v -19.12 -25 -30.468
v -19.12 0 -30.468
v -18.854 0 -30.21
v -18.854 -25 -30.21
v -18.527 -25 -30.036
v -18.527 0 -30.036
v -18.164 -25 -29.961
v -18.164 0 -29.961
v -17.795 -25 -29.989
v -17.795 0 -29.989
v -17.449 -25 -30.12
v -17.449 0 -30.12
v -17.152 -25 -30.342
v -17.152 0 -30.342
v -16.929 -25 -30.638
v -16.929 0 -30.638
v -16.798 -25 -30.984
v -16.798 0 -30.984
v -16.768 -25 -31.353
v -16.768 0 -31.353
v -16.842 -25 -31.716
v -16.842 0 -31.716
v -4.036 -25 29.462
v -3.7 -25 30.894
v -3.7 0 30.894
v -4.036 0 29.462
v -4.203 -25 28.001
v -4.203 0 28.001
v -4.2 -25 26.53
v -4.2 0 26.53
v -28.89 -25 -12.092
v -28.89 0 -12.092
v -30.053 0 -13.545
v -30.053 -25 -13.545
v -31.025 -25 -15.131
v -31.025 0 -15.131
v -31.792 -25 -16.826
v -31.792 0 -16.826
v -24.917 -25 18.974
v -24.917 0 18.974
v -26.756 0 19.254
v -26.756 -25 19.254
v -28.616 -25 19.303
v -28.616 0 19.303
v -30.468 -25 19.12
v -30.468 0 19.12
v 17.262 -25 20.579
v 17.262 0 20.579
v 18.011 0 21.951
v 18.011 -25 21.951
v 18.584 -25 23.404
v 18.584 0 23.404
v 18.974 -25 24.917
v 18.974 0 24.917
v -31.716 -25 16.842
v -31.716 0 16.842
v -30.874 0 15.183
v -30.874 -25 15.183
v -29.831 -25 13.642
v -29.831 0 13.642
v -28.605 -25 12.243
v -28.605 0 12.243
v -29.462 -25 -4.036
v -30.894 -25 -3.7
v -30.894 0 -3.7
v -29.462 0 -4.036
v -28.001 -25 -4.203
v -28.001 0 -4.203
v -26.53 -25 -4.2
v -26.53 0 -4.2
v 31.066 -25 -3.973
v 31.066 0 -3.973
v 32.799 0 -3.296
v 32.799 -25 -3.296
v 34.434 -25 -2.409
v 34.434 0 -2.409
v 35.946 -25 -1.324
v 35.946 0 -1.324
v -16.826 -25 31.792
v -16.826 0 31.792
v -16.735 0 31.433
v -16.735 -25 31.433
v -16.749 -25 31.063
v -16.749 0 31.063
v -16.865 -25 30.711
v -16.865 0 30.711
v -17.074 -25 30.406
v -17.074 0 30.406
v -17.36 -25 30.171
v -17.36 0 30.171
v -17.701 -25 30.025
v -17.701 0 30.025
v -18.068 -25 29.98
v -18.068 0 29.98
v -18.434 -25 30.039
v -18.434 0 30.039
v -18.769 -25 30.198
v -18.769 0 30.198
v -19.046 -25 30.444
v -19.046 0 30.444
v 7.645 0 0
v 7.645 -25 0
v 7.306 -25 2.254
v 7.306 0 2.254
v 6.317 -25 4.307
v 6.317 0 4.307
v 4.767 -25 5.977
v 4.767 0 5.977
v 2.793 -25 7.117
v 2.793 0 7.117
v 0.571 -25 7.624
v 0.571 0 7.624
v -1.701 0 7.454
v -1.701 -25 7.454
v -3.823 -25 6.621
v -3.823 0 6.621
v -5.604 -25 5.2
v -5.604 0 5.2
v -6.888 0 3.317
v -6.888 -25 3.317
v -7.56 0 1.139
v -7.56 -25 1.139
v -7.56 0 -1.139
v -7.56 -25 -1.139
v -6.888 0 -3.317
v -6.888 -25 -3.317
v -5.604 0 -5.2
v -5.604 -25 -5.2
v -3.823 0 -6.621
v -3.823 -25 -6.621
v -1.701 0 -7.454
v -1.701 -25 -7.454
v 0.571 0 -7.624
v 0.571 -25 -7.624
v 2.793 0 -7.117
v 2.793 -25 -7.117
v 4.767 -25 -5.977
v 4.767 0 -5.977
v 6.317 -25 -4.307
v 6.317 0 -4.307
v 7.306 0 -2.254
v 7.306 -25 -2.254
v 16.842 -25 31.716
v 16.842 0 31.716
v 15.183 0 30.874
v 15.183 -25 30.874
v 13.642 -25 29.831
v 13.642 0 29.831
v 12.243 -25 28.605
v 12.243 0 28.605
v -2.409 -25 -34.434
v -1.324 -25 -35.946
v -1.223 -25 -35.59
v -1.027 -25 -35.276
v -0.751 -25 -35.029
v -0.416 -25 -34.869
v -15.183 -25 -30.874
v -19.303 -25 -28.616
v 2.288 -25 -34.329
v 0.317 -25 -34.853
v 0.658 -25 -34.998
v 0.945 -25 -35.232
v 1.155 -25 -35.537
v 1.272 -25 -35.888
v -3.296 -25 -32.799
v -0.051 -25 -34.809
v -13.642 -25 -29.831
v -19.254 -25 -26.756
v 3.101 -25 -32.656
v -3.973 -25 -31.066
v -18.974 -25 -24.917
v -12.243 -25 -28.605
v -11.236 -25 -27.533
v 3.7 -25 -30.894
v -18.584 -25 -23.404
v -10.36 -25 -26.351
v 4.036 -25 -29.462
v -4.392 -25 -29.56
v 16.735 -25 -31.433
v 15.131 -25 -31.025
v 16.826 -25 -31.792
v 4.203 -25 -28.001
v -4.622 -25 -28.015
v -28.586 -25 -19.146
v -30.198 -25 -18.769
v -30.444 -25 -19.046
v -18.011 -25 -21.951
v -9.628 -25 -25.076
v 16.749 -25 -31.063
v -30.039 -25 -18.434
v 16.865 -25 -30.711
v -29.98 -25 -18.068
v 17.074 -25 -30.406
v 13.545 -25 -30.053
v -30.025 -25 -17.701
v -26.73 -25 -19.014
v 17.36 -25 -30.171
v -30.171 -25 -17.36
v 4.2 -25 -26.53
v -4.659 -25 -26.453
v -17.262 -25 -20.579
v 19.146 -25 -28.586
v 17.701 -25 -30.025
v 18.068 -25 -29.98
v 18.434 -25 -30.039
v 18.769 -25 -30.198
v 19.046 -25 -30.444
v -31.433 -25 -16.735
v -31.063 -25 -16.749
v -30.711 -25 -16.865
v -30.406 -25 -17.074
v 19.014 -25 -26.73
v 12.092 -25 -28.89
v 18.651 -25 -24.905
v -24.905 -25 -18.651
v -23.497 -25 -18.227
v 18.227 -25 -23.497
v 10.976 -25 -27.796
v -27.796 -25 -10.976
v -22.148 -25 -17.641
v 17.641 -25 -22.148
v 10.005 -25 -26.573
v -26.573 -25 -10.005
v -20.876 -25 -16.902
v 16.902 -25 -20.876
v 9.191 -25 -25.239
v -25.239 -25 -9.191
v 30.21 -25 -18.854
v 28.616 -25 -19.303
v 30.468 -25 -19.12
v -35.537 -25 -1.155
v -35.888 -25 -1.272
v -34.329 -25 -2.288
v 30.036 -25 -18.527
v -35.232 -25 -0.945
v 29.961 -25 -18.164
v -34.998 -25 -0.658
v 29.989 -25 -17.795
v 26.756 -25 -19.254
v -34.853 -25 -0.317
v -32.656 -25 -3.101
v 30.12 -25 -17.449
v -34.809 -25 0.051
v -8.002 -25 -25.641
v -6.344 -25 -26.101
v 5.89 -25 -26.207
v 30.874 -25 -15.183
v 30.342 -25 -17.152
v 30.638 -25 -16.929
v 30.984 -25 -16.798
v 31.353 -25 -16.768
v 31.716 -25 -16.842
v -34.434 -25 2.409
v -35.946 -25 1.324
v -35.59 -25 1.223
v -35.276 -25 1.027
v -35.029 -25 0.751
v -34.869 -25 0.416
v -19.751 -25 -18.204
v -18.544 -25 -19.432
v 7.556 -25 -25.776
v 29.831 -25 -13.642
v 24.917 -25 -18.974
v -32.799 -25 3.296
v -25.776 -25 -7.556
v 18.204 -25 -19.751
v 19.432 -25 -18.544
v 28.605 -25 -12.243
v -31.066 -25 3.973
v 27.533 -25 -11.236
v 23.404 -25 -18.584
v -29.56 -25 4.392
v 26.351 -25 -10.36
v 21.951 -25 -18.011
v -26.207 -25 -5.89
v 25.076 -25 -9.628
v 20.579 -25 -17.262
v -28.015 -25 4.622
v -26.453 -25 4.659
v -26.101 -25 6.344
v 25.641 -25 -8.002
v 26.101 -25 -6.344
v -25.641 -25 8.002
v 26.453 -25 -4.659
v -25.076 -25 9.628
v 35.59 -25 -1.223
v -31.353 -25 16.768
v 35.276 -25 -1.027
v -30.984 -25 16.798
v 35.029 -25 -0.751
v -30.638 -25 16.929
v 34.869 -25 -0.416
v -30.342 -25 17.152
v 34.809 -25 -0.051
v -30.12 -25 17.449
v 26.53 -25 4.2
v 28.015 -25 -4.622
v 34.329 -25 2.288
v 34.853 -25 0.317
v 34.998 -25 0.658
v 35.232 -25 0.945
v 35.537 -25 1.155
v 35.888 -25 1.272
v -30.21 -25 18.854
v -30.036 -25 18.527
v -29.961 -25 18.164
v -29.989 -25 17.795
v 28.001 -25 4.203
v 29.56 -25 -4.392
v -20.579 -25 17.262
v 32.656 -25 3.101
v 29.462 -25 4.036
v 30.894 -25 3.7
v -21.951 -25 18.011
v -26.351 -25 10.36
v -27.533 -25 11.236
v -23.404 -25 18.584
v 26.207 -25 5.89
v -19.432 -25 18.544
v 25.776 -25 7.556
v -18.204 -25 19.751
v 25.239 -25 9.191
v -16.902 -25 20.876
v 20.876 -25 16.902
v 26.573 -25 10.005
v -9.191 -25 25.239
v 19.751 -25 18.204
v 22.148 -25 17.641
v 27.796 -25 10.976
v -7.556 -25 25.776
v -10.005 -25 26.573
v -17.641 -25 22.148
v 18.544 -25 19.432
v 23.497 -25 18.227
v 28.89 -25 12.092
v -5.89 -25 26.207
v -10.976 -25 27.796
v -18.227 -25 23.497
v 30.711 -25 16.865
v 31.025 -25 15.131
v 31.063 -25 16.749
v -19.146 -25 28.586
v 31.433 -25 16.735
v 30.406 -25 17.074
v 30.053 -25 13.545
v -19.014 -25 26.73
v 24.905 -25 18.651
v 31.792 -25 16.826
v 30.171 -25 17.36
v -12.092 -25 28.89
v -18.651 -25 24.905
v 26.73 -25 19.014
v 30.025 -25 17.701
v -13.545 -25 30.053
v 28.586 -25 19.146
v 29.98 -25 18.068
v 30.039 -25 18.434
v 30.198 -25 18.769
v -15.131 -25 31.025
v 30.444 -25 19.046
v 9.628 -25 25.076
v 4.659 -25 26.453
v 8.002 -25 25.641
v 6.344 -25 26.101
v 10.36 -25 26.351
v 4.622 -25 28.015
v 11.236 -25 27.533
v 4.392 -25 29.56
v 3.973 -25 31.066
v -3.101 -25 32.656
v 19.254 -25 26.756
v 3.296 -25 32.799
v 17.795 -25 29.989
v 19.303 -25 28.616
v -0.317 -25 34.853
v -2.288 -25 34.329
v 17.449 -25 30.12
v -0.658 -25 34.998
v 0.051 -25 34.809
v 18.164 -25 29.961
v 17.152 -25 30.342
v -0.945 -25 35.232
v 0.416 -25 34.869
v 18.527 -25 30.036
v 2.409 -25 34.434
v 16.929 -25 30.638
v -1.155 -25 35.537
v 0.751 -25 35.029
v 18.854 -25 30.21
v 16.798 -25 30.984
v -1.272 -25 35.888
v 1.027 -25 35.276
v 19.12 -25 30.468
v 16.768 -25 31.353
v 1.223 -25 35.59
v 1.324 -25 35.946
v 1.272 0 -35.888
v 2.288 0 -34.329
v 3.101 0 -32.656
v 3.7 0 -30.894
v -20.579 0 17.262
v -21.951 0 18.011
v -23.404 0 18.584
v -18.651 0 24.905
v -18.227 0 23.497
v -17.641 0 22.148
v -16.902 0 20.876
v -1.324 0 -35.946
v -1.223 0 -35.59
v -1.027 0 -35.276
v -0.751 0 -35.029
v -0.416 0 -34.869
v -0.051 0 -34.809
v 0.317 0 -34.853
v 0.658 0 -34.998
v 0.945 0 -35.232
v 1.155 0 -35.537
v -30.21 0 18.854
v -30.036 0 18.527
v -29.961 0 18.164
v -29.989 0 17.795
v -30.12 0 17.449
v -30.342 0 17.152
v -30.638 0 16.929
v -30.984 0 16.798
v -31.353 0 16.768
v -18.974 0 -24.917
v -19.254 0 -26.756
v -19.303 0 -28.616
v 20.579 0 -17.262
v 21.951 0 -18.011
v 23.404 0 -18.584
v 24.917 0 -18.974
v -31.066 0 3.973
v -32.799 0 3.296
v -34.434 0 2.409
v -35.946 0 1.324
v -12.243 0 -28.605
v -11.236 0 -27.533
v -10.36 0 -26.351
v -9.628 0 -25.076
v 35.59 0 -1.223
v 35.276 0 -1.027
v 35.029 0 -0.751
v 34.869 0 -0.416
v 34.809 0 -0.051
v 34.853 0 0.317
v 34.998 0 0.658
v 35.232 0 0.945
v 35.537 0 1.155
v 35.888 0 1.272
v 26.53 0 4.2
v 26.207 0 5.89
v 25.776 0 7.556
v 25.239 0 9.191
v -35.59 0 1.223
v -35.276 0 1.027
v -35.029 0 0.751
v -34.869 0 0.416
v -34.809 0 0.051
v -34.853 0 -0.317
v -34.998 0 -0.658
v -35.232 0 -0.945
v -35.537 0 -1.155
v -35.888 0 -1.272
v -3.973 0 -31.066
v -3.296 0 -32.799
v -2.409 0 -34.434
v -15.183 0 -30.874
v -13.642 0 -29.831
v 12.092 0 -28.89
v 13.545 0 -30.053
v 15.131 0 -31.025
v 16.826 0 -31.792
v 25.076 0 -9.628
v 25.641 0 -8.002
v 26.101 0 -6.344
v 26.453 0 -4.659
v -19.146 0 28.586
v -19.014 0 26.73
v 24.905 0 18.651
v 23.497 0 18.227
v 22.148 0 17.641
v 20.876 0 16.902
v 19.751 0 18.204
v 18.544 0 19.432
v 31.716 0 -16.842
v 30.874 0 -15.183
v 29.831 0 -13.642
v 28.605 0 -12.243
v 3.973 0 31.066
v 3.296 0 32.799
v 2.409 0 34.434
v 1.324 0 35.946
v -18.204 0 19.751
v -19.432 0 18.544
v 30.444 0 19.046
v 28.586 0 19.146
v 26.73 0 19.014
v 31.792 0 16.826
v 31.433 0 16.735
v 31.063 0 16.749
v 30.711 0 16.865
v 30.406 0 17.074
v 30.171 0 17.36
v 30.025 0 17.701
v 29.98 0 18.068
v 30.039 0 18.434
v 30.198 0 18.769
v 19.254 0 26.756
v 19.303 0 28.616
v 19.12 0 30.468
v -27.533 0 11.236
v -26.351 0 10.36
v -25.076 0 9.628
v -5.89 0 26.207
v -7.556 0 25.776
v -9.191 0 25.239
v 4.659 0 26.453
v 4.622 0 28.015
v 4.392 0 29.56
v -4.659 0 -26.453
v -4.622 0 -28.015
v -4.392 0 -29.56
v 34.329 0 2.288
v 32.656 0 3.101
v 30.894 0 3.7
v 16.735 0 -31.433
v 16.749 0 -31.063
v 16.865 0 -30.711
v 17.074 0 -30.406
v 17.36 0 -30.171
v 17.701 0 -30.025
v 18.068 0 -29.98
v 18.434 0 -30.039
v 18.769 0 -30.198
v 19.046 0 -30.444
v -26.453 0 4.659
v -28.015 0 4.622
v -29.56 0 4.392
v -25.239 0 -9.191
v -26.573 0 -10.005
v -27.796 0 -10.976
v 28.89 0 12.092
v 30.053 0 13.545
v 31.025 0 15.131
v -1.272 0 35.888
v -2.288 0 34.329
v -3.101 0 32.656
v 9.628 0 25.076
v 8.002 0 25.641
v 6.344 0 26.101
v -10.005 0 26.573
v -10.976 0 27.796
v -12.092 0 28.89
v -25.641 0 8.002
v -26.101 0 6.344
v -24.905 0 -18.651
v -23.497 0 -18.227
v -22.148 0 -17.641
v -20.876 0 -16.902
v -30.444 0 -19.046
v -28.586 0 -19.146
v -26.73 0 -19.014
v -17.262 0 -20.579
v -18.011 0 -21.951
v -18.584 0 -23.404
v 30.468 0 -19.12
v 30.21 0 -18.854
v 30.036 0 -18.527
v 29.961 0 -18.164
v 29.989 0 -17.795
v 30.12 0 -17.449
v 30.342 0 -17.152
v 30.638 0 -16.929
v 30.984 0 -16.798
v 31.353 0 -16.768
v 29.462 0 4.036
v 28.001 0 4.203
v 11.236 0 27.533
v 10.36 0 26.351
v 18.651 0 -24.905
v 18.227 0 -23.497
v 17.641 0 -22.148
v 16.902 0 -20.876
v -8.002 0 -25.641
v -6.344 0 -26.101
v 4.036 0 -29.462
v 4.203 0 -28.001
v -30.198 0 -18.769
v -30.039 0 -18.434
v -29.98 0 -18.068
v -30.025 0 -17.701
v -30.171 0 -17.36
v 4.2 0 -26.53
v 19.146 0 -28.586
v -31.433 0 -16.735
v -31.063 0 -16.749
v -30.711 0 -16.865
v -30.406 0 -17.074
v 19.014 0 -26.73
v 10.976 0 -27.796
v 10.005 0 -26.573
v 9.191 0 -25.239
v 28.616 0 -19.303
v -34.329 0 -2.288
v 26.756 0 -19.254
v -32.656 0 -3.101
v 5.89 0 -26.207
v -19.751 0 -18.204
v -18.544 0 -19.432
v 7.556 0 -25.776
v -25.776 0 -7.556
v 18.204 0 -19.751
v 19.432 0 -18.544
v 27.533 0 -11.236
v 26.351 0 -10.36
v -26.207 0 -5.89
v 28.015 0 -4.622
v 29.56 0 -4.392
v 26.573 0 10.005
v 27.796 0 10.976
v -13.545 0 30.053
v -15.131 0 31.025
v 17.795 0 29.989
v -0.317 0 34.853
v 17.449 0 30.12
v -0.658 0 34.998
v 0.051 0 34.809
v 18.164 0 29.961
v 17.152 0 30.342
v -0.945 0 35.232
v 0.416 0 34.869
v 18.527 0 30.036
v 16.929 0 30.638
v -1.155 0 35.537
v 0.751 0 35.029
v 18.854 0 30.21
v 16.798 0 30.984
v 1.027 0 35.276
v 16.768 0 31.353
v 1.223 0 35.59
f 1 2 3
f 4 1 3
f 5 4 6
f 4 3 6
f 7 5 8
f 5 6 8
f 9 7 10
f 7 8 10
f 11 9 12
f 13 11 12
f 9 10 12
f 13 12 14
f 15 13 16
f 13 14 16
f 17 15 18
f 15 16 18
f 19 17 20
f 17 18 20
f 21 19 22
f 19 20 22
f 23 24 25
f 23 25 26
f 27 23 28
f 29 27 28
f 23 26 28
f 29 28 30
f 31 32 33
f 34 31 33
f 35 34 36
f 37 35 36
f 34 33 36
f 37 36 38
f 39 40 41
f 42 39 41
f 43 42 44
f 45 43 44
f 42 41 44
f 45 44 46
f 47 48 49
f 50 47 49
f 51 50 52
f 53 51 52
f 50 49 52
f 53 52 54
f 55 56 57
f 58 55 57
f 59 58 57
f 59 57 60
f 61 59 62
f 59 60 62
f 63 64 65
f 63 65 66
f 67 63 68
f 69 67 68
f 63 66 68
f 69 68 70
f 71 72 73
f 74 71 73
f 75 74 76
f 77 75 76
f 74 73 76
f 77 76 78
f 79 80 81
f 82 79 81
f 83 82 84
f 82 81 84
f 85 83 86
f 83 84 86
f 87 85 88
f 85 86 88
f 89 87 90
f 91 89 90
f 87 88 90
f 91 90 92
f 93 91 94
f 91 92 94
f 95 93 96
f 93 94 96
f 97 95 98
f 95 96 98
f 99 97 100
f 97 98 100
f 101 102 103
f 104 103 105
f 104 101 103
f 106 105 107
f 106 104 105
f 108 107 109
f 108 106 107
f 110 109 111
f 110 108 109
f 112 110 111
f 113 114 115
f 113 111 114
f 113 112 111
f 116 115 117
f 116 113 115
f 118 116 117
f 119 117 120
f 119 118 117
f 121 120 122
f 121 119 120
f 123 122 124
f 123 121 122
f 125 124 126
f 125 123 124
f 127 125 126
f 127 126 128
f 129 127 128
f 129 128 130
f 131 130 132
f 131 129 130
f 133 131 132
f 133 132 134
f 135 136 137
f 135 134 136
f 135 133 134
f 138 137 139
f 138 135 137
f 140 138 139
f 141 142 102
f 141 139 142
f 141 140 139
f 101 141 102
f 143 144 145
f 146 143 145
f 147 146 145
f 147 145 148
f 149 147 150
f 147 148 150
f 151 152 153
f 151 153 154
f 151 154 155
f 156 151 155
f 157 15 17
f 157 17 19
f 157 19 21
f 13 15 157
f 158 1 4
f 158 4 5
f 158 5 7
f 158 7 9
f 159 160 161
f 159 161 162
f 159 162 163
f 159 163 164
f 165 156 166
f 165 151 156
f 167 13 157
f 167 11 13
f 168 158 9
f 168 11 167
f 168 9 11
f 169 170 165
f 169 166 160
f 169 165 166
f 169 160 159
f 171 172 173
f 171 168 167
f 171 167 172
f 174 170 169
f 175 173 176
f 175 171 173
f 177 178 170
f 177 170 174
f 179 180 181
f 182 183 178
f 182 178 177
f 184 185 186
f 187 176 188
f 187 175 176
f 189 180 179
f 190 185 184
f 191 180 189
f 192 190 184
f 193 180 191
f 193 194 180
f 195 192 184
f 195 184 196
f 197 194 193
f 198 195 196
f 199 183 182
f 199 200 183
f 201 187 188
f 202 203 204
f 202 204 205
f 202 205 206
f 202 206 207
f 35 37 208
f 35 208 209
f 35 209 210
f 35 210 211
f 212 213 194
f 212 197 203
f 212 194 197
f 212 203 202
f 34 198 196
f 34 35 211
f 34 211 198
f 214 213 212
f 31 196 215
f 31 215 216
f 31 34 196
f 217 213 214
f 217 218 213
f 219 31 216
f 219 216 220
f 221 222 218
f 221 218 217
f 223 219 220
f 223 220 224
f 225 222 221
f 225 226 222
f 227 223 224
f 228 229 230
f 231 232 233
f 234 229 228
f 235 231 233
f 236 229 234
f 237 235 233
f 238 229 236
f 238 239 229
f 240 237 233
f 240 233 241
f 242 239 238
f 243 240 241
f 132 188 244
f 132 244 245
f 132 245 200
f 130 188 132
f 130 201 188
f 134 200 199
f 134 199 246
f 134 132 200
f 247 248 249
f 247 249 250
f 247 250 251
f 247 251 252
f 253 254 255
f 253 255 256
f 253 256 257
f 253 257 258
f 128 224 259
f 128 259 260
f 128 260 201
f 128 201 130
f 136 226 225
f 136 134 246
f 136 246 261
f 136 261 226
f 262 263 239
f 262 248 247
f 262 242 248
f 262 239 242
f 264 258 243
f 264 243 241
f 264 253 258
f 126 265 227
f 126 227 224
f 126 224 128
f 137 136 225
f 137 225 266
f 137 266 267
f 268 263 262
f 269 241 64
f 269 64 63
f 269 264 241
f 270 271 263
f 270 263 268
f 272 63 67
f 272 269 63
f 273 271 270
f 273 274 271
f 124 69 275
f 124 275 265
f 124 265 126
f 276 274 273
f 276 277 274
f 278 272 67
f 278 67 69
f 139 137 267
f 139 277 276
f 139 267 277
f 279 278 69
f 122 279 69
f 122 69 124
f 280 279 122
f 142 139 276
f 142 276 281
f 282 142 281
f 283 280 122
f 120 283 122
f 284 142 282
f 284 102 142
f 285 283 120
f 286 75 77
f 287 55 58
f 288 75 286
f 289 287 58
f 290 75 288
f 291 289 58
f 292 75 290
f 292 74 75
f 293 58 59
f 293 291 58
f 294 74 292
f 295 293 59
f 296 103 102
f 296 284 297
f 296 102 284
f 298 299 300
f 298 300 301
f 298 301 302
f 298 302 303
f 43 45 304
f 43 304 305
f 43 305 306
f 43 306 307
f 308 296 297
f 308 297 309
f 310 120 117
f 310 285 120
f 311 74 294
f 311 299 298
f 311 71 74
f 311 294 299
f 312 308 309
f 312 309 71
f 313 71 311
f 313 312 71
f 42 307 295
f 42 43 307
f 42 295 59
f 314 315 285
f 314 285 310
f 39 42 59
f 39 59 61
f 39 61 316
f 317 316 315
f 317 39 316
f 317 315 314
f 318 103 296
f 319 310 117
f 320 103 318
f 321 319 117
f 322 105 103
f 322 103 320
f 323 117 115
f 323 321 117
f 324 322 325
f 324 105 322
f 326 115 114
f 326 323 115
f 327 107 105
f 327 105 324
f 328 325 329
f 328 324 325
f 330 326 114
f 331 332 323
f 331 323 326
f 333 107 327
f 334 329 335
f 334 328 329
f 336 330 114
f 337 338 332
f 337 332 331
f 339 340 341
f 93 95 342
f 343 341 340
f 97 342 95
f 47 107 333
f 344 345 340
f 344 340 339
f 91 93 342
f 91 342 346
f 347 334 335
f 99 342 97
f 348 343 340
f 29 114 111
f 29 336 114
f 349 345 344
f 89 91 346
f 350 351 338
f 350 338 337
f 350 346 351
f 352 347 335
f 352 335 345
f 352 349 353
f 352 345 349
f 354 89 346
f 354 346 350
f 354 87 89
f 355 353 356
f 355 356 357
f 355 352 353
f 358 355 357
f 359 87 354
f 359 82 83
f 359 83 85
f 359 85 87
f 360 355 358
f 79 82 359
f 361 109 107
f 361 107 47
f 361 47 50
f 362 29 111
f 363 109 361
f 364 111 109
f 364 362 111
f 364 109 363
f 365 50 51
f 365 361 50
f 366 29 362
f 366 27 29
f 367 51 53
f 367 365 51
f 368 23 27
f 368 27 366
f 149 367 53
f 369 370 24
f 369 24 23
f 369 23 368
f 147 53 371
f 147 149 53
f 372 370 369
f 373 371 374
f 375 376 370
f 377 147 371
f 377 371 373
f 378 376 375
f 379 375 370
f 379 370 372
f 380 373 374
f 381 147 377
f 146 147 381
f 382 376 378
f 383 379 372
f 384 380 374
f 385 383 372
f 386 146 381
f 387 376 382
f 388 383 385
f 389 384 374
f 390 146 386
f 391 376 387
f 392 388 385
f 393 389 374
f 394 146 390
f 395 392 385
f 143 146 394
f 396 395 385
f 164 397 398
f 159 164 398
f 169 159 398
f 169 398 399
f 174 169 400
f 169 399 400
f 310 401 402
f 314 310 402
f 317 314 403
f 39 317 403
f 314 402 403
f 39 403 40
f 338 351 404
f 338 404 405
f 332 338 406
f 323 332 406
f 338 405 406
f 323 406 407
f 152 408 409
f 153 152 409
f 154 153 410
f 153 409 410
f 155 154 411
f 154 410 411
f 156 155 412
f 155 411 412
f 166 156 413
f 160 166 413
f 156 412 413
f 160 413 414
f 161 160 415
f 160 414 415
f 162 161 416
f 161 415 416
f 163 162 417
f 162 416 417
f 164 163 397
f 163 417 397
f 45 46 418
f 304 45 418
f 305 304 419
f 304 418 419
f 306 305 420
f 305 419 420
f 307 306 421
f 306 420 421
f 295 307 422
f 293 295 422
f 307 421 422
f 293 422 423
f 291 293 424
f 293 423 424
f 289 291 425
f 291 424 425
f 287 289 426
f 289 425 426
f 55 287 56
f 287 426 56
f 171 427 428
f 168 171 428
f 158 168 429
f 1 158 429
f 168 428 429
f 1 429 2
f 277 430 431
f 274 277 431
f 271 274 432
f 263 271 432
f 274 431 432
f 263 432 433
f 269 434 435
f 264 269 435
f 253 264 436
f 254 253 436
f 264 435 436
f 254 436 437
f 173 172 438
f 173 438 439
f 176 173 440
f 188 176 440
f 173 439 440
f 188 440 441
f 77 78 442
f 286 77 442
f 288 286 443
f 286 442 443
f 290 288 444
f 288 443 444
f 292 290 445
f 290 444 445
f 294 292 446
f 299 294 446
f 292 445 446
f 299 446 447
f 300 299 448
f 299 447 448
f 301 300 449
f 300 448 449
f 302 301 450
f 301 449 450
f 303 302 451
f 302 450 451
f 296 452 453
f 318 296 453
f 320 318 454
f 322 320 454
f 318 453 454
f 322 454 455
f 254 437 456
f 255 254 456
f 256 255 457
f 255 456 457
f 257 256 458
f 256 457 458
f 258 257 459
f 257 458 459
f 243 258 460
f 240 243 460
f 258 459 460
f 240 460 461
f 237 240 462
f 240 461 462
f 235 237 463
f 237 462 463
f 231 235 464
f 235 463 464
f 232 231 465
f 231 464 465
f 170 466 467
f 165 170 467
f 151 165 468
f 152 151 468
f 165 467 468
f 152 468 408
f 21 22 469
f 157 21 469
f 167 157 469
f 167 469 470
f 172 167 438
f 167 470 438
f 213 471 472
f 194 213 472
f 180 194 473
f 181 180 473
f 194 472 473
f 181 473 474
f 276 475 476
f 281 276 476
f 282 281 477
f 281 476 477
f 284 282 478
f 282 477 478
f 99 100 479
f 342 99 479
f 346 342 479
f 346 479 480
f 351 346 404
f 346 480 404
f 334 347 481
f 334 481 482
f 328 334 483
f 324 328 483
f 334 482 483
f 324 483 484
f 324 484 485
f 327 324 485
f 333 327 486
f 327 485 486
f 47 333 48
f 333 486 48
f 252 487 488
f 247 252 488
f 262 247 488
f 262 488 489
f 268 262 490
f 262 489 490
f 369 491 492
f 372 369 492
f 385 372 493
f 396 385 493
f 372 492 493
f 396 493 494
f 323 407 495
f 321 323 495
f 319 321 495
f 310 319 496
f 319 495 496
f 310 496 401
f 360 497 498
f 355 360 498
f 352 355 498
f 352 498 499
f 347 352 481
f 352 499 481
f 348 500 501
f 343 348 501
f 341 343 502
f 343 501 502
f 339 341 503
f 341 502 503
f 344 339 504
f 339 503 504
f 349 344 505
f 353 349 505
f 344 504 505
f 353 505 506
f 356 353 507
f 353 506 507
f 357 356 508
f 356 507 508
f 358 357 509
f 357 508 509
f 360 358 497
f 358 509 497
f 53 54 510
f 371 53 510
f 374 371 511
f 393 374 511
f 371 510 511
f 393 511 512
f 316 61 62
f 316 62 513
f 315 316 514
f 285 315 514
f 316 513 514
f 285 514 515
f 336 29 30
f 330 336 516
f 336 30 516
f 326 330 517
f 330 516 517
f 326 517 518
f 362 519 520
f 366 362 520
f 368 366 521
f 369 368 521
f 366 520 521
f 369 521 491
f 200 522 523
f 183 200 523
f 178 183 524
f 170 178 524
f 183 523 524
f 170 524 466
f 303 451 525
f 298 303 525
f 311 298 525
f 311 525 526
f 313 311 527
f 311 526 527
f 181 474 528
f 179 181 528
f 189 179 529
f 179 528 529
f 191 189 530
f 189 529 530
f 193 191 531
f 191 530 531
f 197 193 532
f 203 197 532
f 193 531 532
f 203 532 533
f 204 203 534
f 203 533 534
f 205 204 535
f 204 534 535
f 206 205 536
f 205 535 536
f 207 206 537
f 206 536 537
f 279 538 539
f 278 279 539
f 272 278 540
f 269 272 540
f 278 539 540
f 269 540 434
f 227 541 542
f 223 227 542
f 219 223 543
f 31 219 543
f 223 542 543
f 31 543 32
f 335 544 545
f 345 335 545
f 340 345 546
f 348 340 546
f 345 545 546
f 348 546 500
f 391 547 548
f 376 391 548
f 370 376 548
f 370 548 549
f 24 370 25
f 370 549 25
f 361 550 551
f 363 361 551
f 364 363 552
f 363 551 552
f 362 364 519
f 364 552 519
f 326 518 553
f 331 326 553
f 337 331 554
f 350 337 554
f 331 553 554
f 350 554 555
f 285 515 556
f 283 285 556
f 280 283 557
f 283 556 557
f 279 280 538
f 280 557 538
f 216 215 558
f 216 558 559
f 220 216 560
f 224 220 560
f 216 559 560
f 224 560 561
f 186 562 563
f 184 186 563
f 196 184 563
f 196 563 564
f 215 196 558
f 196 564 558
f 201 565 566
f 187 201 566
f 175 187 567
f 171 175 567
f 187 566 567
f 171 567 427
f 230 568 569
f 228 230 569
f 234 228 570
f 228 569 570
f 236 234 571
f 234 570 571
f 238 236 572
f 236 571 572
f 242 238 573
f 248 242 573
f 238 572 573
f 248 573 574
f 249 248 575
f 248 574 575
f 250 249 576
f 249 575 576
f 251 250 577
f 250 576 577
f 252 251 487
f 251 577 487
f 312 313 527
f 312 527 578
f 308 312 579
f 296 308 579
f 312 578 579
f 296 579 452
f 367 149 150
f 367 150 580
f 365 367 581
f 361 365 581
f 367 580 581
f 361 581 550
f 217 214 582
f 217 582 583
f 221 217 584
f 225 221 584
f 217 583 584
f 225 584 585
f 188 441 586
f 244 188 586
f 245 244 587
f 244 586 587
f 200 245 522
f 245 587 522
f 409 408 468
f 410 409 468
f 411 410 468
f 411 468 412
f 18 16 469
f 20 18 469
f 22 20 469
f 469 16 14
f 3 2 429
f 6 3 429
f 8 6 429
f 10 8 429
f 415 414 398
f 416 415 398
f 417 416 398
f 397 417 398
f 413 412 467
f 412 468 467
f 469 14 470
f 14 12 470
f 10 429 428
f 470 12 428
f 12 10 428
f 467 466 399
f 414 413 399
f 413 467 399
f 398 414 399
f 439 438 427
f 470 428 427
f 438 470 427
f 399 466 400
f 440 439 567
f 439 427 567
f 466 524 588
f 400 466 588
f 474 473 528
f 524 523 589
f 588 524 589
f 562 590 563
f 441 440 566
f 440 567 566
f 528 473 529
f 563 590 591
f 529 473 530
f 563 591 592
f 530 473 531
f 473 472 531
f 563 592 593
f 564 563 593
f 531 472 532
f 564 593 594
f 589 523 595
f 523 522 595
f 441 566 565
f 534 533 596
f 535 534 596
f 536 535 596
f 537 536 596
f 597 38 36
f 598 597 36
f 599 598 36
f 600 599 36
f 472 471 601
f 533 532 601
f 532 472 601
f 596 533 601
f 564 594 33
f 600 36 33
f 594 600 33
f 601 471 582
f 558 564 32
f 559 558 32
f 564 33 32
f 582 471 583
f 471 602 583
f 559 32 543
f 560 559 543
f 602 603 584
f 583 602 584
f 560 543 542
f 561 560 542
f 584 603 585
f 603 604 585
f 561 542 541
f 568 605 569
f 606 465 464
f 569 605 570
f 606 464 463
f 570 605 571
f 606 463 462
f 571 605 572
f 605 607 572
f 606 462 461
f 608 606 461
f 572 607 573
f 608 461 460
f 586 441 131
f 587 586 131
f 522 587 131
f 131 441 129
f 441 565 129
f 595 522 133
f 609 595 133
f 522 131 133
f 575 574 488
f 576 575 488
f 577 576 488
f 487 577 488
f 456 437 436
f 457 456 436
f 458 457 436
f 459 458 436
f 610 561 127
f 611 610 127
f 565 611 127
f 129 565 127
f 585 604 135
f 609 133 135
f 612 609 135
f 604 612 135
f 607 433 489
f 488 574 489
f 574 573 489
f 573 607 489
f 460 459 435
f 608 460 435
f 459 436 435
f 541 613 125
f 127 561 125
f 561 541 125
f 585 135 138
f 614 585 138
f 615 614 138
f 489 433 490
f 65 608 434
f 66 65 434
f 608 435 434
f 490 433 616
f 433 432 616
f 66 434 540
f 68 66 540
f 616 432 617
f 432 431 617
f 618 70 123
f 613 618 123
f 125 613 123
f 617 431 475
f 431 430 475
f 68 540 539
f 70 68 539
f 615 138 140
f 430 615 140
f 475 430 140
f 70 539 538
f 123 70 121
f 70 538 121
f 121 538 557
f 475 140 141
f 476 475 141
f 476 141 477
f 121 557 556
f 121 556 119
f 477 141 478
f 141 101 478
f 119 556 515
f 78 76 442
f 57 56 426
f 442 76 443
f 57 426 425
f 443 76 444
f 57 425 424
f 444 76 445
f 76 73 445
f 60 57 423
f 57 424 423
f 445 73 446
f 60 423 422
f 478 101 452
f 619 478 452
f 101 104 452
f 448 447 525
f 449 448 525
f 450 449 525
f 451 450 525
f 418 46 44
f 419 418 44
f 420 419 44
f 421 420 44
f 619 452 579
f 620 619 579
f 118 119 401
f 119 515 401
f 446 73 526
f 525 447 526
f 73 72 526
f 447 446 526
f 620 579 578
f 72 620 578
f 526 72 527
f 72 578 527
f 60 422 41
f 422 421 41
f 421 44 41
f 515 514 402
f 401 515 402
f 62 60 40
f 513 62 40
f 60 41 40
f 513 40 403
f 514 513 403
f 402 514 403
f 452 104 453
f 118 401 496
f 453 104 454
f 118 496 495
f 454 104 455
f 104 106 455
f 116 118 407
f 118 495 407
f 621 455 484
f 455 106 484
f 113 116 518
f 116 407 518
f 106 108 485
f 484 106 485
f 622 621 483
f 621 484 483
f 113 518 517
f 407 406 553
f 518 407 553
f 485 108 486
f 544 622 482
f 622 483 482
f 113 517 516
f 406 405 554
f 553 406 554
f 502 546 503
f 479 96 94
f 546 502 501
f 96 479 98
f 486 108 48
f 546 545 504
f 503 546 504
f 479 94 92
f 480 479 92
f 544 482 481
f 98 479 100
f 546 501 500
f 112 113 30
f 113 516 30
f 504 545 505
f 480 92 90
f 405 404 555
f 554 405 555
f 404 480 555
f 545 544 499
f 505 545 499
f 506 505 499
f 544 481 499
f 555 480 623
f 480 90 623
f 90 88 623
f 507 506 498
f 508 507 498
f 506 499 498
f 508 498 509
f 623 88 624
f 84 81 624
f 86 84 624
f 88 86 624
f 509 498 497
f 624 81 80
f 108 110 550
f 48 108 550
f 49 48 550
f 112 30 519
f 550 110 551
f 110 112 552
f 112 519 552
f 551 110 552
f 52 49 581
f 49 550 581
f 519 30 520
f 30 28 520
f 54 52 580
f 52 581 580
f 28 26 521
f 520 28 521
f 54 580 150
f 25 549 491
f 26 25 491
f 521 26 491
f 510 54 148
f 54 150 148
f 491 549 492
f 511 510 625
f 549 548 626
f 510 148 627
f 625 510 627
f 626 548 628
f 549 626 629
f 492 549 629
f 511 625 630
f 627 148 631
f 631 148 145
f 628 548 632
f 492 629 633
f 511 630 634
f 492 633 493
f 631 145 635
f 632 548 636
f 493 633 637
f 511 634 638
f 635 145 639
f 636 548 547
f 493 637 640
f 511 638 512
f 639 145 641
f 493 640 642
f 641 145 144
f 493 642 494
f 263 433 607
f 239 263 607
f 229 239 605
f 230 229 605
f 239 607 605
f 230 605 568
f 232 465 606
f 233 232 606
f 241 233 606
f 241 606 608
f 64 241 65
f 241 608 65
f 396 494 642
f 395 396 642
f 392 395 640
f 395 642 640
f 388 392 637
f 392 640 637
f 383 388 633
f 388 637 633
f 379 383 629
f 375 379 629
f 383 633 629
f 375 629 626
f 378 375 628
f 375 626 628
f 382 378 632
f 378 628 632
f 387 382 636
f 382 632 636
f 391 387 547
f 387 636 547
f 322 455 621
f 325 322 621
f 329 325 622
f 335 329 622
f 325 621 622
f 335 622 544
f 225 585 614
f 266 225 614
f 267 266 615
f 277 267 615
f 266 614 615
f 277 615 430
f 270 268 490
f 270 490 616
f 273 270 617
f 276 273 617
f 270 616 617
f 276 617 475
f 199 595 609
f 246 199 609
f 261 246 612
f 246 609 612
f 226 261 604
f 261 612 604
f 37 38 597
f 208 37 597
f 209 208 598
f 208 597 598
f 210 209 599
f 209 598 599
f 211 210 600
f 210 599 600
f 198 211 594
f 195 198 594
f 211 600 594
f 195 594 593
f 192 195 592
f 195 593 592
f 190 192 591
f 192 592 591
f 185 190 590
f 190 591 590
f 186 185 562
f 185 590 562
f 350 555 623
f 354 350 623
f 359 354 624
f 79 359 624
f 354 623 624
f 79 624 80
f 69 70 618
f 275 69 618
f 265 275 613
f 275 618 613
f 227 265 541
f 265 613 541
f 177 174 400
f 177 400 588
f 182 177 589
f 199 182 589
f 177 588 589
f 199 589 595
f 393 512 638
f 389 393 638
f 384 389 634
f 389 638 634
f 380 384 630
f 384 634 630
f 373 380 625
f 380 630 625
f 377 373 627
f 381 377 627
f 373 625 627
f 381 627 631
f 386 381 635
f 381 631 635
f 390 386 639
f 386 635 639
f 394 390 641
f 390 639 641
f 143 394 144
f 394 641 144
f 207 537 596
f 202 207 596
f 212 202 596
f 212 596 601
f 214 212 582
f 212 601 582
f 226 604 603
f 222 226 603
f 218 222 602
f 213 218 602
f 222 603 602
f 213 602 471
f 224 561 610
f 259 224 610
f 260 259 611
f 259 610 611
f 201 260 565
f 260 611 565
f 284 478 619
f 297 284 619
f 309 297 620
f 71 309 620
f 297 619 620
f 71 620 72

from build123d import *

# Parameters (mm, degrees)
F0_R     = 7.6453811345
F1_DEPTH = 25
F2_COUNT = 12


with BuildPart() as f1:
    # F0 (on Front) → F1 (new body)
    with BuildSketch(Plane.XZ):
        with BuildLine():
            ThreePointArc((-4.199583616, 26.5301707062), (0.2331271007, 26.859488305), (4.6594538037, 26.4532786342))
            ThreePointArc((4.6594538037, 26.4532786342), (4.5311676373, 28.7913934414), (3.9730198519, 31.0655326722))
            ThreePointArc((3.9730198519, 31.0655326722), (2.8779662016, 33.6301332845), (1.3244981356, 35.9459605158))
            ThreePointArc((1.3244981356, 35.9459605158), (0.0510003023, 34.8088199887), (-1.2719943746, 35.8879726168))
            ThreePointArc((-1.2719943746, 35.8879726168), (-2.7205256231, 33.5051012356), (-3.6999932599, 30.8941699945))
            ThreePointArc((-3.6999932599, 30.8941699945), (-4.1411626969, 28.7340788632), (-4.199583616, 26.5301707062))
        make_face()
        with BuildLine():
            ThreePointArc((-4.199583616, 26.5301707062), (-17.4453940129, -20.4241202499), (26.8605, 0))
            ThreePointArc((26.8605, 0), (20.5747626857, 17.2674723303), (4.6594538037, 26.4532786342))
            ThreePointArc((4.6594538037, 26.4532786342), (0.2331271007, 26.859488305), (-4.199583616, 26.5301707062))
        make_face()
        Circle(F0_R, mode=Mode.SUBTRACT)
    extrude(amount=F1_DEPTH)

    # F2: F1 ×12 about axis
    f2_axis = Axis((0, 0, 0), (0, 1, 0))


with BuildPart() as f1_1:
    add(f1.part)
    for i in range(1, F2_COUNT):
        add(f1.part.rotate(f2_axis, i * 360 / F2_COUNT))


solid = f1_1.part
